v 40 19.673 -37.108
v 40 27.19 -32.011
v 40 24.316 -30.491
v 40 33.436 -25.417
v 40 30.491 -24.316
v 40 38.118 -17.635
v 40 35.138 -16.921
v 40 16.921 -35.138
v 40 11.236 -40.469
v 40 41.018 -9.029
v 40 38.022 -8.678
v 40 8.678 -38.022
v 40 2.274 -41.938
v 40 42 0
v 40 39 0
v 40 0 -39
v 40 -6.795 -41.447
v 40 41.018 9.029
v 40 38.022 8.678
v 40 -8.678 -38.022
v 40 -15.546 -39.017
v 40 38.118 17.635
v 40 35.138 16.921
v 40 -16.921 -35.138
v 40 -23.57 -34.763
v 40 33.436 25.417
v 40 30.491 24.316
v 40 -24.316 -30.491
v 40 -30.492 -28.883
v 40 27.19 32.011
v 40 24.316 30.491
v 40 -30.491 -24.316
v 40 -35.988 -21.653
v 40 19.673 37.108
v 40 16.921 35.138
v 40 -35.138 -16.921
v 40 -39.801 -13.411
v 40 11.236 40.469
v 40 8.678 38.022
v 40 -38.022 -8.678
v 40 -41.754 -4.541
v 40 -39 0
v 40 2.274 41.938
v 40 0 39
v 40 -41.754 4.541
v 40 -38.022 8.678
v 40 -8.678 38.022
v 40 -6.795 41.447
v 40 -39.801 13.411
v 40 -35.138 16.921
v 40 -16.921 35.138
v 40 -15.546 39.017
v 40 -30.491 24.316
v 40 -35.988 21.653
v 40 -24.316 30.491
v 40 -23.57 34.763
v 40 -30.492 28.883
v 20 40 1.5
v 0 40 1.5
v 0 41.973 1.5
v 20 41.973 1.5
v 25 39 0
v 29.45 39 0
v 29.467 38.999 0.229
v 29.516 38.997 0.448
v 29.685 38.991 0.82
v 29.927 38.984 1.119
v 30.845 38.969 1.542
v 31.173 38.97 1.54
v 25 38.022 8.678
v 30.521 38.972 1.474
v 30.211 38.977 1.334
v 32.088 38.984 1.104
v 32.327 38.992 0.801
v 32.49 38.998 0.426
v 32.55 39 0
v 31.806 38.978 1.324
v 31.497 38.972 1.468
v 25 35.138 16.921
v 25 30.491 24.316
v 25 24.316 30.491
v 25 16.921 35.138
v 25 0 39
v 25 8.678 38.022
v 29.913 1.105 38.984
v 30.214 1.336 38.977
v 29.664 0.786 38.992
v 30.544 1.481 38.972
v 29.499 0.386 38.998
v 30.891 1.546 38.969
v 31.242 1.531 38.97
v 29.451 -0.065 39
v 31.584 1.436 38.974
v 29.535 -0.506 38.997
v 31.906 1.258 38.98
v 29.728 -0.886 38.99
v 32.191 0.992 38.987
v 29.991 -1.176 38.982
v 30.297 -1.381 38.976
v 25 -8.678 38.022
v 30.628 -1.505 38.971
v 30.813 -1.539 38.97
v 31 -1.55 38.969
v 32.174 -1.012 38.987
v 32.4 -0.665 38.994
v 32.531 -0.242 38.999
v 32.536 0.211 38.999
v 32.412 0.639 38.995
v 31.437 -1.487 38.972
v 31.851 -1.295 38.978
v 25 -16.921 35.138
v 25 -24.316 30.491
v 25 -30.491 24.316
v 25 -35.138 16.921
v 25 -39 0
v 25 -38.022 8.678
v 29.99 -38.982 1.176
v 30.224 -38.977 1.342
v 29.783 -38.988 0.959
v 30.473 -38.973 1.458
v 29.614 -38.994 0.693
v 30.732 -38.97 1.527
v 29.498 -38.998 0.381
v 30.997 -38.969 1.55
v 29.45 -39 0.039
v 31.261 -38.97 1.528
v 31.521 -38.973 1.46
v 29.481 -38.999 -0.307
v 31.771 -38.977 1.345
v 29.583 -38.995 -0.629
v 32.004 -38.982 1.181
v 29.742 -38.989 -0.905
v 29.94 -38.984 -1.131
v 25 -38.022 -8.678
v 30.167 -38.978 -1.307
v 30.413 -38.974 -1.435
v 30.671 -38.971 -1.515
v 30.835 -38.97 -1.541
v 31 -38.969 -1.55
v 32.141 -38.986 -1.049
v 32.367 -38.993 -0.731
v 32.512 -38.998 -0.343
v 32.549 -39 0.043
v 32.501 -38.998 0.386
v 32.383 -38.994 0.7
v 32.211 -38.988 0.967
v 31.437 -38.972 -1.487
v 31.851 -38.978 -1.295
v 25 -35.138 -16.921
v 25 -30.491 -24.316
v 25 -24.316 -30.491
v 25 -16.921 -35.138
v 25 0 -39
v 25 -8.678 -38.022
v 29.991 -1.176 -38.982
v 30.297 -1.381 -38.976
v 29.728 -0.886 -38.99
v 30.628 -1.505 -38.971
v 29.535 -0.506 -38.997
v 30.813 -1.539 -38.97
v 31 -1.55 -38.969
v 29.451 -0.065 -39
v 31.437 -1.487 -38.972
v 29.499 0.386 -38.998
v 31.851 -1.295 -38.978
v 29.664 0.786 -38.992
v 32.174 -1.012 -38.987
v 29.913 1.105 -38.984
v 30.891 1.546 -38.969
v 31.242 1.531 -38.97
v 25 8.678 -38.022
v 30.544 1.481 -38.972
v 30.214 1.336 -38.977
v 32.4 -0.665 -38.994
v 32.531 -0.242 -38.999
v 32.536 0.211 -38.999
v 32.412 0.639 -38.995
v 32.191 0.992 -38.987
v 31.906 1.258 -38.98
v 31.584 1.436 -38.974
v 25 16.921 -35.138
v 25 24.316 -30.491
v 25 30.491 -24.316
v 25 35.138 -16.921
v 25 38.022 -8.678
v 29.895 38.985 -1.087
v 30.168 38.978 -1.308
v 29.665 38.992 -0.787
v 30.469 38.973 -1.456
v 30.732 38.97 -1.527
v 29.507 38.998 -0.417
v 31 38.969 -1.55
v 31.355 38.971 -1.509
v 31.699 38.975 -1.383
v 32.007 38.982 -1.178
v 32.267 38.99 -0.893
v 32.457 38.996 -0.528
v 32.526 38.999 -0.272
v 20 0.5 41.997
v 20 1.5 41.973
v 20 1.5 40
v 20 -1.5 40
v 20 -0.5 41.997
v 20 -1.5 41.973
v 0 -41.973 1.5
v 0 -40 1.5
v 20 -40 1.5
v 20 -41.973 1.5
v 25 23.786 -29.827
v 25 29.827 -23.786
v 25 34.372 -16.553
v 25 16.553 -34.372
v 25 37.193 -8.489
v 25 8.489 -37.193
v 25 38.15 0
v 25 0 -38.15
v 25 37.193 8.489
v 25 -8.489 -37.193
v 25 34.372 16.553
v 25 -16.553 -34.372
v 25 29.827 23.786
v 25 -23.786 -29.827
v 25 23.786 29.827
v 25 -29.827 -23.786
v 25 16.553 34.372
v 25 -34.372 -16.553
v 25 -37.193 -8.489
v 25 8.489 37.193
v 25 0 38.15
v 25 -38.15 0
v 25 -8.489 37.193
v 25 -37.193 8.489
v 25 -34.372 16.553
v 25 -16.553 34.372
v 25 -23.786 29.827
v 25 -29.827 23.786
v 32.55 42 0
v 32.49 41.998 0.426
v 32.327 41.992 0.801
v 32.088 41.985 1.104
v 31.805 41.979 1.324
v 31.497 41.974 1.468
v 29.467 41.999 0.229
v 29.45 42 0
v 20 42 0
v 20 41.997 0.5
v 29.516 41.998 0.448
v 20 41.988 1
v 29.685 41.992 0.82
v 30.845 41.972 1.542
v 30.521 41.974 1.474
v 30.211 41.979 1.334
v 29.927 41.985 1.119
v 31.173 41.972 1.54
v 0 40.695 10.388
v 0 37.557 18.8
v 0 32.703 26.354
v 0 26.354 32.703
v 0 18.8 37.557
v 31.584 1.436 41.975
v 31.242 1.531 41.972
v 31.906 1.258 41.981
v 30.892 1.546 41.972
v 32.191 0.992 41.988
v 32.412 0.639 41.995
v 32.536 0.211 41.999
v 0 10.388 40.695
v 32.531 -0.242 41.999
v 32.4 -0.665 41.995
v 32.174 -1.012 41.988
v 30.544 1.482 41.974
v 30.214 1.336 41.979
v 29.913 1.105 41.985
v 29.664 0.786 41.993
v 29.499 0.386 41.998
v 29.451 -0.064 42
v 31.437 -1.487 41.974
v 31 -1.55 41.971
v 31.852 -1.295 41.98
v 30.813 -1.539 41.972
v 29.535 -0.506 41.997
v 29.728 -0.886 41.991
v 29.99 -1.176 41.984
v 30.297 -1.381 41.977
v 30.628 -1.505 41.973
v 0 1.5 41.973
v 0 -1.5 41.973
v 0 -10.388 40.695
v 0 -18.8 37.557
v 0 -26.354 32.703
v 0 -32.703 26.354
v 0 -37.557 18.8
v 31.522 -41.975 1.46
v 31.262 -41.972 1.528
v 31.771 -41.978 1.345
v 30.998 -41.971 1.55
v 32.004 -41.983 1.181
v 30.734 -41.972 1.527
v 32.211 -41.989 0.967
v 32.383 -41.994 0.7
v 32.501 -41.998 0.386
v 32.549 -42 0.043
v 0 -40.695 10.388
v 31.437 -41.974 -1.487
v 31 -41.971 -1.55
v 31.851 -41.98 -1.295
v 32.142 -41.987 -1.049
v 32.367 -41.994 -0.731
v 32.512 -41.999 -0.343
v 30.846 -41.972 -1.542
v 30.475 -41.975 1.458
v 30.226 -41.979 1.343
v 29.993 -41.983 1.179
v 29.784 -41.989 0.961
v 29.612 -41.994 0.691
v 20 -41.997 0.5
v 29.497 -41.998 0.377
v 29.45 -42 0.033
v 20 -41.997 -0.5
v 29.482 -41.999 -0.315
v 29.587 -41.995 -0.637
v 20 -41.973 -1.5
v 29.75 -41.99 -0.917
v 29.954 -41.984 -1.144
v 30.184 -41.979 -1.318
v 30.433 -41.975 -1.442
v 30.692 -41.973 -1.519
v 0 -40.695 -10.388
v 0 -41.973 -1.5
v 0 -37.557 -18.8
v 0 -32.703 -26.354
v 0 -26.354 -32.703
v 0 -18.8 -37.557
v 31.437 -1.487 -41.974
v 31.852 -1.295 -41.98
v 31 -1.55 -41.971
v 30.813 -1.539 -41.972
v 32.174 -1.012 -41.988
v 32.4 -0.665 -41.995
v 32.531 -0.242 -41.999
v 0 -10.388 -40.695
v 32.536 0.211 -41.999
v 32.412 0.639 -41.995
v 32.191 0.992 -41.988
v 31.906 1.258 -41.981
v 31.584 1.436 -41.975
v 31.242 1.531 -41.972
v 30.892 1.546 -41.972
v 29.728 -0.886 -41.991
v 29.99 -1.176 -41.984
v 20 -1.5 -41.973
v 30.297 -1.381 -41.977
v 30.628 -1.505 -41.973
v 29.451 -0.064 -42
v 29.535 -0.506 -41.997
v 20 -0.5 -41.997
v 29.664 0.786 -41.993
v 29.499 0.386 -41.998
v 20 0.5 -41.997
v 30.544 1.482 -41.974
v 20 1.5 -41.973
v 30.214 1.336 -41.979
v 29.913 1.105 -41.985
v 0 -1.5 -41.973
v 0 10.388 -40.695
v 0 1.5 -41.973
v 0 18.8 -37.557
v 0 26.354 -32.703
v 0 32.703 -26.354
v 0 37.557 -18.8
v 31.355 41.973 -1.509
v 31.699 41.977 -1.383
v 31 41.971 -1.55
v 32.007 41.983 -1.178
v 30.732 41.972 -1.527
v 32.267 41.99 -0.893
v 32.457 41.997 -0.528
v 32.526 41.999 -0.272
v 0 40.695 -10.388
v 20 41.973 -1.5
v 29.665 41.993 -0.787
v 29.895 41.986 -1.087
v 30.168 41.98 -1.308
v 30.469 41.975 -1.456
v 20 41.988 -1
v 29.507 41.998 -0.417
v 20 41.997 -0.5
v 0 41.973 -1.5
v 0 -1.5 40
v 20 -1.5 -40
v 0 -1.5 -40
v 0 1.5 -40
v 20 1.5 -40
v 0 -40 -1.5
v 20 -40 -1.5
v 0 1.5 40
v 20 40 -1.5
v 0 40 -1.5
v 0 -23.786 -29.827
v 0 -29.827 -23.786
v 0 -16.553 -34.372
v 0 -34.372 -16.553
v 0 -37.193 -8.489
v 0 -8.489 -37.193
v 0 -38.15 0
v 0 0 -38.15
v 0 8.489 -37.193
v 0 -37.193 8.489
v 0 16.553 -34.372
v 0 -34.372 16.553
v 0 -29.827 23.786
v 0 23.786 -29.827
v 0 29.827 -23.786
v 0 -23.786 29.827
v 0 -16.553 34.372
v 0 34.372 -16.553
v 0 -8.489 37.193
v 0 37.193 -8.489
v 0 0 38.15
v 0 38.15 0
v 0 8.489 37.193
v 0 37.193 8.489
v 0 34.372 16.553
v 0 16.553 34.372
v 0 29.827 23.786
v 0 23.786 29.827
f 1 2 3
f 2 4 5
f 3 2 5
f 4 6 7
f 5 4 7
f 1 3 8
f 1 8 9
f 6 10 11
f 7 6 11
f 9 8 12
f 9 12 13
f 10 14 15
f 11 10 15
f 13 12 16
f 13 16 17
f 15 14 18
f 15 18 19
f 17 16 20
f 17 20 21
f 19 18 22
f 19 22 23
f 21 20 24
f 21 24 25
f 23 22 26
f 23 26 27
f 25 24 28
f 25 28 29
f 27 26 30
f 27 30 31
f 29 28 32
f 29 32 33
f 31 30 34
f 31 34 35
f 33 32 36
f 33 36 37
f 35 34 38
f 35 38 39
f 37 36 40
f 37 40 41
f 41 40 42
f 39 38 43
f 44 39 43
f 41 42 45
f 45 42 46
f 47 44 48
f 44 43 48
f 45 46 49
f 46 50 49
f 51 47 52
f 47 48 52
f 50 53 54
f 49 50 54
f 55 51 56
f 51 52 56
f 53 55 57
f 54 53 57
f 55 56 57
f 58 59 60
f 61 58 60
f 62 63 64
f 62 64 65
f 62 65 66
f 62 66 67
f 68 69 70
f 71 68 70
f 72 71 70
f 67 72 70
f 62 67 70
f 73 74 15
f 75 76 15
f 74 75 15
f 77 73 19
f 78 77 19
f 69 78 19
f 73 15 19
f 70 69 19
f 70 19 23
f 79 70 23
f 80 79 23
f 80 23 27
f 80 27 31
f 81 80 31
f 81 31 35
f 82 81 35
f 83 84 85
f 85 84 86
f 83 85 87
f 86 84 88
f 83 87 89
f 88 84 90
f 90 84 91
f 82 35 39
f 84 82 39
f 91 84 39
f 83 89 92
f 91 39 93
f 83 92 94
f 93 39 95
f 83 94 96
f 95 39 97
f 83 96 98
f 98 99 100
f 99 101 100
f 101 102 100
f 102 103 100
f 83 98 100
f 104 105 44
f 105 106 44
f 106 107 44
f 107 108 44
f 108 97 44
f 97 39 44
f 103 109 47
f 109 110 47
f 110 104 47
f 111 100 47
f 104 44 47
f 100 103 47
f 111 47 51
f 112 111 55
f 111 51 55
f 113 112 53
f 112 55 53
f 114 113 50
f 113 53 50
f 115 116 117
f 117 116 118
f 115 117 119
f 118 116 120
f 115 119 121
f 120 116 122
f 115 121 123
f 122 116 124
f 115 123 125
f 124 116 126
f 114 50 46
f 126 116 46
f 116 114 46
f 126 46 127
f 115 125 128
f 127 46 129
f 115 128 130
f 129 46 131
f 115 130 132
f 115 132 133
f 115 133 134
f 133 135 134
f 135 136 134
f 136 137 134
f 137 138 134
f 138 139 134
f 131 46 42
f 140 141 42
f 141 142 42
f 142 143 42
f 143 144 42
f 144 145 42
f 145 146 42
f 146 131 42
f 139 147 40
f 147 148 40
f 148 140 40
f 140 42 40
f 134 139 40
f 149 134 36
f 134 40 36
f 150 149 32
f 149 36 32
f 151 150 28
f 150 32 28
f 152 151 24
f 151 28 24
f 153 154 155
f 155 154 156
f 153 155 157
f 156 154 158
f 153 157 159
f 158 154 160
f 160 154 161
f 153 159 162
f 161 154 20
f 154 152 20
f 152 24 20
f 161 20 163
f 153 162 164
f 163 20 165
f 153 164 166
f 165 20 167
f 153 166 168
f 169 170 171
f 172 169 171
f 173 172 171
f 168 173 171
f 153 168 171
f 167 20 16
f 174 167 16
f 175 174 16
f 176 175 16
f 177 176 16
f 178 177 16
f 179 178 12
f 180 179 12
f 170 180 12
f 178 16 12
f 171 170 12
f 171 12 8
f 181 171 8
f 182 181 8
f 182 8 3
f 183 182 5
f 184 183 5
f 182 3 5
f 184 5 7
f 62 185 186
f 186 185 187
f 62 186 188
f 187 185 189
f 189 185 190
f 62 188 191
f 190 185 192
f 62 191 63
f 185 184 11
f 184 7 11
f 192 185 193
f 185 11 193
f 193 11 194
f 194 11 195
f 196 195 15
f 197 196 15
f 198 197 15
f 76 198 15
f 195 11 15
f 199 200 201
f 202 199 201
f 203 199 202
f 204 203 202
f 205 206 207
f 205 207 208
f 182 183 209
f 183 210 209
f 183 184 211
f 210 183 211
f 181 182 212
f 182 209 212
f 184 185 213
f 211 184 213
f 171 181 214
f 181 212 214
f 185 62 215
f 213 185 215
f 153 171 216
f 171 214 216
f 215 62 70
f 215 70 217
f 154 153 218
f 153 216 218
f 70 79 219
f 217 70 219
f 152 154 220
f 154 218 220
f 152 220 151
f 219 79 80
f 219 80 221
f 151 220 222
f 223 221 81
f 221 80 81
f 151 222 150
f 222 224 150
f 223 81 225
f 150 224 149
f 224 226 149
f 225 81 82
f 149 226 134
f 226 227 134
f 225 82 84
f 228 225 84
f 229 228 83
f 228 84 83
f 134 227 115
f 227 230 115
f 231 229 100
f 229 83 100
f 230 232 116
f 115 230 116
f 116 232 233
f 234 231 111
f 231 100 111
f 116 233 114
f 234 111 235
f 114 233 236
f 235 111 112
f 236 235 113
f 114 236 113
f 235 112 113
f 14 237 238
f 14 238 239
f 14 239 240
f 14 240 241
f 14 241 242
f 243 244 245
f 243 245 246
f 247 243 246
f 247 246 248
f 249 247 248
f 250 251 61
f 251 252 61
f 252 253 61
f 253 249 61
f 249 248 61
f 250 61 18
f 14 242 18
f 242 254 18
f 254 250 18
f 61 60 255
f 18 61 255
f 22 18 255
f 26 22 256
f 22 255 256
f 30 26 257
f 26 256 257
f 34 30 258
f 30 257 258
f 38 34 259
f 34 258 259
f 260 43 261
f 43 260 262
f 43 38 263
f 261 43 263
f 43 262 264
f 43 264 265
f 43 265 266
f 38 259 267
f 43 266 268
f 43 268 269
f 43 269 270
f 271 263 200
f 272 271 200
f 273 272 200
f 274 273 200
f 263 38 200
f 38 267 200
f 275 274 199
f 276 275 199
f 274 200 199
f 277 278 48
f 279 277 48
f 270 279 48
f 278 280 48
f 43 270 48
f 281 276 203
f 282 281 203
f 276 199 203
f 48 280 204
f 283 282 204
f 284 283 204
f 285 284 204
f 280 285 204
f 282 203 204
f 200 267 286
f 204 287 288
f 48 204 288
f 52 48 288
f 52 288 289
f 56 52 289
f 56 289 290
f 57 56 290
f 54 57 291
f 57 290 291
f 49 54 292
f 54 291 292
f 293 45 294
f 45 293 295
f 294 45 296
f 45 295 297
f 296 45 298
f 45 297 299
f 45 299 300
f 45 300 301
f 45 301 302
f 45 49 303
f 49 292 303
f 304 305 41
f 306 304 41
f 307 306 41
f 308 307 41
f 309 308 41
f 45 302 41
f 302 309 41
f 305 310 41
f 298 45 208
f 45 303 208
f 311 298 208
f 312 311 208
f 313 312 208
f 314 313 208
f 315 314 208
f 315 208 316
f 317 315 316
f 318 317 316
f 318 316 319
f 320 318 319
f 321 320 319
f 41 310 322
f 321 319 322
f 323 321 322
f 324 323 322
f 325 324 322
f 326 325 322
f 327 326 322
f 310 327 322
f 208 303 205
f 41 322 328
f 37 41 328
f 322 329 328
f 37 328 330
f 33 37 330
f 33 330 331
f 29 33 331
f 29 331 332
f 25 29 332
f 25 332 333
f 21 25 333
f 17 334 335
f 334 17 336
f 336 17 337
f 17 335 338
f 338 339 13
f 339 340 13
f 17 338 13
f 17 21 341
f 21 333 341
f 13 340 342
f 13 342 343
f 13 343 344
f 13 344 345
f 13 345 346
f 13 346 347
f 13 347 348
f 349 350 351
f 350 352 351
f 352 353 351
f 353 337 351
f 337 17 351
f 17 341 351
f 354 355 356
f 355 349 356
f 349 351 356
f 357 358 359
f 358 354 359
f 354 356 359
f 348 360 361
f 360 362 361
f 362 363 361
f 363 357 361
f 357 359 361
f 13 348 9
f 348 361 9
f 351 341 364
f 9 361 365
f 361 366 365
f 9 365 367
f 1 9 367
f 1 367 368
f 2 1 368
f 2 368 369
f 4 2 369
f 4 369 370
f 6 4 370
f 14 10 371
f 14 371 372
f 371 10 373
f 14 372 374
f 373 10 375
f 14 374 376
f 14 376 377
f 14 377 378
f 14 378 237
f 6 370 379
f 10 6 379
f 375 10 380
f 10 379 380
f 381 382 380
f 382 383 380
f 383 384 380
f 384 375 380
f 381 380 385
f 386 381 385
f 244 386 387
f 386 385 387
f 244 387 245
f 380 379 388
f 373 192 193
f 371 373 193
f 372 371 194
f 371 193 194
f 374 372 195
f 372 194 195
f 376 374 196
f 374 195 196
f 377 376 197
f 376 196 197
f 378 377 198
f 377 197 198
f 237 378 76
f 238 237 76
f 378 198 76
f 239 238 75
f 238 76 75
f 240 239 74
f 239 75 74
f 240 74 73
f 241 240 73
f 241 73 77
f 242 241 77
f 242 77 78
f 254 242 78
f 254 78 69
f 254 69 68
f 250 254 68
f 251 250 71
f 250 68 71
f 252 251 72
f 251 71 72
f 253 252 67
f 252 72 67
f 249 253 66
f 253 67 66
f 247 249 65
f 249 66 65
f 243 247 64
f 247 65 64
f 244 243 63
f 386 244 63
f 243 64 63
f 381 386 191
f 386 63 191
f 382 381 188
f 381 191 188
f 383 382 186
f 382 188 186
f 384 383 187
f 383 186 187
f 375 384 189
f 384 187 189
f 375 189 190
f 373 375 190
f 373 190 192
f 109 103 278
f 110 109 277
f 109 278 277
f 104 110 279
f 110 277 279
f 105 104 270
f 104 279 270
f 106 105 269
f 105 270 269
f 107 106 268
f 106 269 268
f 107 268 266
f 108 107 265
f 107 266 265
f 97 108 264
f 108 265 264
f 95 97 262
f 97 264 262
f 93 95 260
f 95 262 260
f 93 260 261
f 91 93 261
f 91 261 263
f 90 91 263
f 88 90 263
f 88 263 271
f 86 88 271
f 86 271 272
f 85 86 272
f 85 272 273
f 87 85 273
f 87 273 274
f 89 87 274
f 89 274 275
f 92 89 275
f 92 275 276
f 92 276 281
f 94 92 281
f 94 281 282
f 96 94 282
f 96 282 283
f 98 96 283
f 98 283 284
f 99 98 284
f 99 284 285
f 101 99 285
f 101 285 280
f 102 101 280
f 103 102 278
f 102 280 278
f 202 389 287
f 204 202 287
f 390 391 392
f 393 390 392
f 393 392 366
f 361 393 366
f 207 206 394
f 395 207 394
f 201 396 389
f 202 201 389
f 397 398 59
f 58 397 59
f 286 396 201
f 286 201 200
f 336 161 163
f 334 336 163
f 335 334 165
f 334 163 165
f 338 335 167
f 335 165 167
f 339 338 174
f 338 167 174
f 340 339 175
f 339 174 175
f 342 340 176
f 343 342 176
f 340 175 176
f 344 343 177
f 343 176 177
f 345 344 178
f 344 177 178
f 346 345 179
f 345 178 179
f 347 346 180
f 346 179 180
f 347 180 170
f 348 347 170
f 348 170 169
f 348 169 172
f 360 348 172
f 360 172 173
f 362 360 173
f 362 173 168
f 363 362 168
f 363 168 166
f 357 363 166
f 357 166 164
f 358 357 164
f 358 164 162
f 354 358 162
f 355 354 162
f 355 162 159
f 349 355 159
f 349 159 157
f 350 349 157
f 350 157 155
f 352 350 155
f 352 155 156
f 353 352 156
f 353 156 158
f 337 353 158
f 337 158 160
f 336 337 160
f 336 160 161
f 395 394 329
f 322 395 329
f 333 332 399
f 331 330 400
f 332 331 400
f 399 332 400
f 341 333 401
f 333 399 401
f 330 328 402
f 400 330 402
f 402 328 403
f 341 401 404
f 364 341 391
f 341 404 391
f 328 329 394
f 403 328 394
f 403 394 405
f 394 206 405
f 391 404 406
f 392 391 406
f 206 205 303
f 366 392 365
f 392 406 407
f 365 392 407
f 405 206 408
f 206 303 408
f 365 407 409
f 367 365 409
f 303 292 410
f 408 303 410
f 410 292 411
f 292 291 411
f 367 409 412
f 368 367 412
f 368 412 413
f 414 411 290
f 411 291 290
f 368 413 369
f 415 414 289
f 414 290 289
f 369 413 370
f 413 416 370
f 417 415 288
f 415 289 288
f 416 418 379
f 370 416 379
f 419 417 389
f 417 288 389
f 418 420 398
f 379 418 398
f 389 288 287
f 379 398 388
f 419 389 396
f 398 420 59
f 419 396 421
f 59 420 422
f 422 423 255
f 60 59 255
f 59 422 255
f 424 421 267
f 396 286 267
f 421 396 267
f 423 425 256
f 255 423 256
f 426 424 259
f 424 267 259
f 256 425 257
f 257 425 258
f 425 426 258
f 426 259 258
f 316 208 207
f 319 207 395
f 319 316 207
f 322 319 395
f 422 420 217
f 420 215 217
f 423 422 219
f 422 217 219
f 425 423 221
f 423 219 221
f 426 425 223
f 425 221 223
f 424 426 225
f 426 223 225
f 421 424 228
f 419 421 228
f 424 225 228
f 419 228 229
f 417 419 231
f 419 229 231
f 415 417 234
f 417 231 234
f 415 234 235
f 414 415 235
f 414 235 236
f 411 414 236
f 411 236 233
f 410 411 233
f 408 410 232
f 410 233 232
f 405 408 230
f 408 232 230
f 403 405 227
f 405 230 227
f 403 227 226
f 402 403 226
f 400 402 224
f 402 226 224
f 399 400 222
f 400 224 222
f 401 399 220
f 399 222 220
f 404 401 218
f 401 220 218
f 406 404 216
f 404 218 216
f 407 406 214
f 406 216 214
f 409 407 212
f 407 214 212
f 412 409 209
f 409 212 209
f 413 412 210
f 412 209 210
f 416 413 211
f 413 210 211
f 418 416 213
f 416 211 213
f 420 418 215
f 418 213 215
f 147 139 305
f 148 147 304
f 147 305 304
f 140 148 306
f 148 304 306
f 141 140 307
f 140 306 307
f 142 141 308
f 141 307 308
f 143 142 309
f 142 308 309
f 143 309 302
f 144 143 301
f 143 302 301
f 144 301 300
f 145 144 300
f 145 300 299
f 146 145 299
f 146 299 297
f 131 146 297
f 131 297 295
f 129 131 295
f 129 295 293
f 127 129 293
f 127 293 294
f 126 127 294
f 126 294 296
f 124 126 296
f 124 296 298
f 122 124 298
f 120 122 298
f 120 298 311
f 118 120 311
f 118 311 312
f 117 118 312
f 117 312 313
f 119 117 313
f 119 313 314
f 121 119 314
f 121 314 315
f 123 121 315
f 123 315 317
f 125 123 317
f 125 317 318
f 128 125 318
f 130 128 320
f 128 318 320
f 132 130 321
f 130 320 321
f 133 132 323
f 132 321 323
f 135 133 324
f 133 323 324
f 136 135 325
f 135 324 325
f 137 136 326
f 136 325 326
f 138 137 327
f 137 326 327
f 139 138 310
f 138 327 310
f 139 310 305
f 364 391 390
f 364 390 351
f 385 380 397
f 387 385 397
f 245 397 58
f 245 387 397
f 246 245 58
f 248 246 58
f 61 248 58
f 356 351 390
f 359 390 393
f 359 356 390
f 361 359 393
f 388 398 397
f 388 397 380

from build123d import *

# Parameters (mm, degrees)
D_GAGEMENT_M2_51_D           = 3.1
R_P_TITION_CIRCULAIRE1_COUNT = 2
R_P_TITION_CIRCULAIRE1_ANGLE = 90
ESQUISSE5_W                  = 3
ESQUISSE5_H                  = 15
ENL_V_MAT_EXTRU_1_DEPTH      = 20
R_P_TITION_CIRCULAIRE2_COUNT = 4


with BuildPart() as part:
    # Esquisse1 → Révolution1 (revolve)
    with BuildSketch(Plane.XY):
        Polygon((0, 38.15), (25, 38.15), (25, 39), (40, 39), (40, 42), (0, 42), align=None)
    revolve(axis=Axis((0, 0, 0), (1, 0, 0)))

    # Dégagement M2.51 (through all)
    with Locations(Plane(origin=(31, 42, 0), x_dir=(0, 0, 1), z_dir=(0, 1, 0))):
        with Locations((0, 0)):
            d_gagement_m2_51 = Hole(D_GAGEMENT_M2_51_D / 2)

    # Répétition circulaire1: Dégagement M2.51 ×2 about axis
    r_p_tition_circulaire1_axis = Axis((40, 0, 0), (-1, 0, 0))
    for i in range(1, R_P_TITION_CIRCULAIRE1_COUNT):
        add(d_gagement_m2_51.rotate(r_p_tition_circulaire1_axis, i * R_P_TITION_CIRCULAIRE1_ANGLE / (R_P_TITION_CIRCULAIRE1_COUNT - 1)), mode=Mode.SUBTRACT)

    # Esquisse5 → Enlèv. mat.-Extru.1 (cut)
    with BuildSketch(Plane.ZY):
        with Locations((0, 47.5)):
            Rectangle(ESQUISSE5_W, ESQUISSE5_H)
    enl_v_mat_extru_1 = extrude(amount=-ENL_V_MAT_EXTRU_1_DEPTH, mode=Mode.SUBTRACT)

    # Répétition circulaire2: Enlèv. mat.-Extru.1 ×4 about axis
    r_p_tition_circulaire2_axis = Axis((0, 0, 0), (1, 0, 0))
    for i in range(1, R_P_TITION_CIRCULAIRE2_COUNT):
        add(enl_v_mat_extru_1.rotate(r_p_tition_circulaire2_axis, i * 360 / R_P_TITION_CIRCULAIRE2_COUNT), mode=Mode.SUBTRACT)


solid = part.part
